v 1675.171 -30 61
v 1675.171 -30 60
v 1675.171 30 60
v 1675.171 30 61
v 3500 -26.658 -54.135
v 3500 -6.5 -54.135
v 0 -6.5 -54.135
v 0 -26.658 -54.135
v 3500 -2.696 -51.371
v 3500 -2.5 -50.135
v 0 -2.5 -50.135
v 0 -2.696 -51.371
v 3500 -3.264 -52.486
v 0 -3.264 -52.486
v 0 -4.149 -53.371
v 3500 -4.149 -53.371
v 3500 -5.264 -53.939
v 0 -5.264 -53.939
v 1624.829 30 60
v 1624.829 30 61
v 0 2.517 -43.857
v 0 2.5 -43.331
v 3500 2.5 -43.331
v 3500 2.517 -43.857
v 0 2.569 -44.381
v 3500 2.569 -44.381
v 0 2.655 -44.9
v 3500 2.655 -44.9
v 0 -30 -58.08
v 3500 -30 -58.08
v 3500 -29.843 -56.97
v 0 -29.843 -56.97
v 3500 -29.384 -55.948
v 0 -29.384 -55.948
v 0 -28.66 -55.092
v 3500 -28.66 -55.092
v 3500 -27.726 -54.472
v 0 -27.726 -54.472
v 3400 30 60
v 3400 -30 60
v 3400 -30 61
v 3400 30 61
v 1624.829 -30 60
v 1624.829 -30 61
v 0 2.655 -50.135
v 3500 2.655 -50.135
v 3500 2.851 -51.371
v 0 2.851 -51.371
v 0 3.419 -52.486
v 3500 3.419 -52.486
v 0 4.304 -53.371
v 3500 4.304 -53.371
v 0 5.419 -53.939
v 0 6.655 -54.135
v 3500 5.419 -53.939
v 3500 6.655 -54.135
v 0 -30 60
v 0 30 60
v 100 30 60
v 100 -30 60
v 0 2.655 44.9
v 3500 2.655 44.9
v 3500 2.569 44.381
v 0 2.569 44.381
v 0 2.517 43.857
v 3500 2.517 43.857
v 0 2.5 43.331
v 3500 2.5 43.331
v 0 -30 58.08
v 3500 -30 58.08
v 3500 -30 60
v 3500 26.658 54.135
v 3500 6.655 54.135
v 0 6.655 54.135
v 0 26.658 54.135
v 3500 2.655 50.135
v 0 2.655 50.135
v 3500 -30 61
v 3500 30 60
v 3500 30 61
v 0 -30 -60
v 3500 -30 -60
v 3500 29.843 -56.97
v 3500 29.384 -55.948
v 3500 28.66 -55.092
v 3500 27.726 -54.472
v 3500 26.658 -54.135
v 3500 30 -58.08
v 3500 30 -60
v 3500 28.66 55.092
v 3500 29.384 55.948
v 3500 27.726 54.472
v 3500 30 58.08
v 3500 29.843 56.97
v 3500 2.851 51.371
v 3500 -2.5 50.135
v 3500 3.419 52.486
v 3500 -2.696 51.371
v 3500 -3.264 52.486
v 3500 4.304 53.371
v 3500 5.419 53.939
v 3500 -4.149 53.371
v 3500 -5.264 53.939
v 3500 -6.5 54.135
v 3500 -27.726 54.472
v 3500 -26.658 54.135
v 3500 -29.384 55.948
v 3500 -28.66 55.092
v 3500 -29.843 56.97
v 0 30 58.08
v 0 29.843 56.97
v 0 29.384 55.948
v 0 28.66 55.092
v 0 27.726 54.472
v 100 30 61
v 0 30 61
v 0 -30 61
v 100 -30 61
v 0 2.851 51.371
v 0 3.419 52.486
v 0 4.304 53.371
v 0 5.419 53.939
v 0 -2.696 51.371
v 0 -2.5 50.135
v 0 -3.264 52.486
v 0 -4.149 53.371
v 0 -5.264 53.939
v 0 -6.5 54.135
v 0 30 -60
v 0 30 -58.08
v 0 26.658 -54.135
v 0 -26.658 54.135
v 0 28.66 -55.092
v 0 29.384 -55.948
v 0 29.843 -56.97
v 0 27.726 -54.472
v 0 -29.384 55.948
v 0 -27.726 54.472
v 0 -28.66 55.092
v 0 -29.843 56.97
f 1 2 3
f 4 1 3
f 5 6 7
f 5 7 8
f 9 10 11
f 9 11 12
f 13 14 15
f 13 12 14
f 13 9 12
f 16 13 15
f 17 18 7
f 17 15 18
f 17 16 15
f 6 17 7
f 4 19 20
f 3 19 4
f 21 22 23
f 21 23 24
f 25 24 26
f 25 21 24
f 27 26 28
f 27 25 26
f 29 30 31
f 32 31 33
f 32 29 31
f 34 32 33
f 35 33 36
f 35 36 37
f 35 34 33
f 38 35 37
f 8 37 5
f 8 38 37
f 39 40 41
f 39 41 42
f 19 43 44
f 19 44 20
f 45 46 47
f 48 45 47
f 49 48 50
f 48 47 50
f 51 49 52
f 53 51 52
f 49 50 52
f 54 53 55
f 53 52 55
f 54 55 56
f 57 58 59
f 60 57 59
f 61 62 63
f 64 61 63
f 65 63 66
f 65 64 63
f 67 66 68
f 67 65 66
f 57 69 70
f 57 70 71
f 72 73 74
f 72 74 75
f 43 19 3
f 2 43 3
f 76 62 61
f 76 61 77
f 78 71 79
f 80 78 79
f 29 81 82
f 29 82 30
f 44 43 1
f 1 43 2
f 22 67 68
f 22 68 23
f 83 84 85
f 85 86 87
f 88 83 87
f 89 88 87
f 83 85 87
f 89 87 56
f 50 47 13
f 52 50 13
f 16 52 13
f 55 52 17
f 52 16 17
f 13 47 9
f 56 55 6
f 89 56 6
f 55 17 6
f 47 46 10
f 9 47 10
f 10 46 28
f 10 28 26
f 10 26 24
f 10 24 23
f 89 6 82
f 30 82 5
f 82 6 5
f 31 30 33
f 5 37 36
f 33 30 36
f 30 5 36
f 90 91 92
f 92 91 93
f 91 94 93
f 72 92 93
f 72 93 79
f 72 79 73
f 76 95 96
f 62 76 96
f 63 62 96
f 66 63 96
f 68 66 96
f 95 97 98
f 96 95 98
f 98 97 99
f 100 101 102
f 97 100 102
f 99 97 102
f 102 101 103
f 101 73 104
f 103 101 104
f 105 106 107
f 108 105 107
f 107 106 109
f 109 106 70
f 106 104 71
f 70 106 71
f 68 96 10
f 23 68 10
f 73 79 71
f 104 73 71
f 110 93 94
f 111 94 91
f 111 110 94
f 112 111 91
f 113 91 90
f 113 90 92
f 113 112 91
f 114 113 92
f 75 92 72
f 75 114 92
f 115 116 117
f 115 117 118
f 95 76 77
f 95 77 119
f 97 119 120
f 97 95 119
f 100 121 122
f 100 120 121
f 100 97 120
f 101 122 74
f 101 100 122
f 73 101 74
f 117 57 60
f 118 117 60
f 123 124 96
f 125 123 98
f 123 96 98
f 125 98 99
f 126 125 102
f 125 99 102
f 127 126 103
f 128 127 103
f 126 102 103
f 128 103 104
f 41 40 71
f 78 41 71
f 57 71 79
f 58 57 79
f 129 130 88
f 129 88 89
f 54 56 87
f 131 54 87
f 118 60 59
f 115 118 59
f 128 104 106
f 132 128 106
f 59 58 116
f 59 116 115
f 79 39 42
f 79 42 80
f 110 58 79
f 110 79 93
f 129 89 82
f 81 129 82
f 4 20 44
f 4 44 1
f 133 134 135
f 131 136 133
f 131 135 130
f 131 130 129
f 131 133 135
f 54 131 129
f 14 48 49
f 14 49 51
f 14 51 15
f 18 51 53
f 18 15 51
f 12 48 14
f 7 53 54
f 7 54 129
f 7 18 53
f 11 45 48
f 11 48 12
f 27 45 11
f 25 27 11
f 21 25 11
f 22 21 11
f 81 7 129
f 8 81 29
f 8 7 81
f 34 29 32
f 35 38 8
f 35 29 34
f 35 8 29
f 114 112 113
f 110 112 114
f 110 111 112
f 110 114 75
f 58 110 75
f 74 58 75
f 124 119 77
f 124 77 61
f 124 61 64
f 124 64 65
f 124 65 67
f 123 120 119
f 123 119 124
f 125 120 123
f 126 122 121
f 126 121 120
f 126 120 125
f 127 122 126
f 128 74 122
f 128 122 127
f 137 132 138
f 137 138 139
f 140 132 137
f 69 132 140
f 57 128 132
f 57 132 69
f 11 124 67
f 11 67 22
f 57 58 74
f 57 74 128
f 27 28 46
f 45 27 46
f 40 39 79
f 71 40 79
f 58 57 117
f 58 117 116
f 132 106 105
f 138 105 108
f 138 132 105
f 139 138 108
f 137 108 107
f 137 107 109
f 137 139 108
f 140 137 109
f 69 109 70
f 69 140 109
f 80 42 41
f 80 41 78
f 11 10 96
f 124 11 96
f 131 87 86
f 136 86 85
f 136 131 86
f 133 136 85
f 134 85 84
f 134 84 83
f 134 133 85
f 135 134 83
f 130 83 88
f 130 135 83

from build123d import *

# Parameters (mm, degrees)
VIGA_SB_120_X_12_2_DEPTH   = 3500
CORTAR_EXTRUIR1_DEPTH      = 3501.642798116
CORTAR_EXTRUIR1_DEPTH_BACK = 3501.642798116
CROQUIS4_W                 = 50.341677604
CROQUIS4_H                 = 60
SALIENTE_EXTRUIR1_DEPTH    = 1
CROQUIS6_W                 = 100
CROQUIS6_H                 = 60
SALIENTE_EXTRUIR2_DEPTH    = 1
SALIENTE_EXTRUIR2_2_DEPTH  = 1


with BuildPart() as part:
    # Sketch12 → Viga sb 120 X 12(2) (new body)
    with BuildSketch(Plane.YZ):
        with BuildLine():
            Line((-30, -60), (-30, -58.080070835))
            ThreePointArc((-30, -58.080070835), (-29.052095223, -55.494589303), (-26.657642624, -54.134502919))
            Line((-26.657642624, -54.134502919), (-9.184714752, -51.222135832))
            ThreePointArc((-9.184714752, -51.222135832), (-4.395809555, -48.501963064), (-2.5, -43.331))
            Line((-2.5, -43.331), (-2.5, 43.331))
            ThreePointArc((-2.5, 43.331), (-4.395809555, 48.501963064), (-9.184714752, 51.222135832))
            Line((-9.184714752, 51.222135832), (-26.657642624, 54.134502919))
            ThreePointArc((-26.657642624, 54.134502919), (-29.052095223, 55.494589303), (-30, 58.080070835))
            Line((-30, 58.080070835), (-30, 60))
            Line((-30, 60), (30, 60))
            Line((30, 60), (30, 58.080070835))
            ThreePointArc((30, 58.080070835), (29.052095223, 55.494589303), (26.657642624, 54.134502919))
            Line((26.657642624, 54.134502919), (9.184714752, 51.222135832))
            ThreePointArc((9.184714752, 51.222135832), (4.395809555, 48.501963064), (2.5, 43.331))
            Line((2.5, 43.331), (2.5, -43.331))
            ThreePointArc((2.5, -43.331), (4.395809555, -48.501963064), (9.184714752, -51.222135832))
            Line((9.184714752, -51.222135832), (26.657642624, -54.134502919))
            ThreePointArc((26.657642624, -54.134502919), (29.052095223, -55.494589303), (30, -58.080070835))
            Line((30, -58.080070835), (30, -60))
            Line((30, -60), (-30, -60))
        make_face()
    extrude(amount=VIGA_SB_120_X_12_2_DEPTH)

    # Croquis3 → Cortar-Extruir1 (cut, two sides: drawn at the far end of the back side and taken through both)
    with BuildSketch(Plane.ZY.offset(-CORTAR_EXTRUIR1_DEPTH_BACK)):
        with BuildLine():
            Line((54.134502919, 26.657642624), (44.900203823, 26.657642624))
            Line((44.900203823, 26.657642624), (44.900203823, 2.655409548))
            Line((44.900203823, 2.655409548), (50.134502919, 2.655409548))
            ThreePointArc((50.134502919, 2.655409548), (52.962930044, 3.826982423), (54.134502919, 6.655409548))
            Line((54.134502919, 6.655409548), (54.134502919, 26.657642624))
        make_face()
        with BuildLine():
            Line((54.134502919, -26.657642624), (43.331, -26.657642624))
            Line((43.331, -26.657642624), (43.331, -2.5))
            Line((43.331, -2.5), (50.134502919, -2.5))
            ThreePointArc((50.134502919, -2.5), (52.962930044, -3.671572875), (54.134502919, -6.5))
            Line((54.134502919, -6.5), (54.134502919, -26.657642624))
        make_face()
        with BuildLine():
            Line((-43.331, -26.657642624), (-43.331, -2.5))
            Line((-43.331, -2.5), (-50.134502919, -2.5))
            ThreePointArc((-50.134502919, -2.5), (-52.962930044, -3.671572875), (-54.134502919, -6.5))
            Line((-54.134502919, -6.5), (-54.134502919, -26.657642624))
            Line((-54.134502919, -26.657642624), (-43.331, -26.657642624))
        make_face()
        with BuildLine():
            Line((-44.900203823, 26.657642624), (-44.900203823, 2.655409548))
            Line((-44.900203823, 2.655409548), (-50.134502919, 2.655409548))
            ThreePointArc((-50.134502919, 2.655409548), (-52.962930044, 3.826982423), (-54.134502919, 6.655409548))
            Line((-54.134502919, 6.655409548), (-54.134502919, 26.657642624))
            Line((-54.134502919, 26.657642624), (-44.900203823, 26.657642624))
        make_face()
    extrude(amount=CORTAR_EXTRUIR1_DEPTH + CORTAR_EXTRUIR1_DEPTH_BACK, mode=Mode.SUBTRACT)


with BuildPart() as body_2:
    # Croquis4 → Saliente-Extruir1 (new body)
    with BuildSketch(Plane.XY.offset(60)):
        with Locations((1650, 0)):
            Rectangle(CROQUIS4_W, CROQUIS4_H)
    extrude(amount=SALIENTE_EXTRUIR1_DEPTH)


with BuildPart() as body_3:
    # Croquis6 → Saliente-Extruir2 (new body)
    with BuildSketch(Plane.XY.offset(60)):
        with Locations((3450, 0)):
            Rectangle(CROQUIS6_W, CROQUIS6_H)
    extrude(amount=SALIENTE_EXTRUIR2_DEPTH)


with BuildPart() as body_4:
    # Croquis6 → Saliente-Extruir2 2 (new body)
    with BuildSketch(Plane.XY.offset(60)):
        with Locations((50, 0)):
            Rectangle(CROQUIS6_W, CROQUIS6_H)
    extrude(amount=SALIENTE_EXTRUIR2_2_DEPTH)


solid = Compound([part.part, body_2.part, body_3.part, body_4.part])
